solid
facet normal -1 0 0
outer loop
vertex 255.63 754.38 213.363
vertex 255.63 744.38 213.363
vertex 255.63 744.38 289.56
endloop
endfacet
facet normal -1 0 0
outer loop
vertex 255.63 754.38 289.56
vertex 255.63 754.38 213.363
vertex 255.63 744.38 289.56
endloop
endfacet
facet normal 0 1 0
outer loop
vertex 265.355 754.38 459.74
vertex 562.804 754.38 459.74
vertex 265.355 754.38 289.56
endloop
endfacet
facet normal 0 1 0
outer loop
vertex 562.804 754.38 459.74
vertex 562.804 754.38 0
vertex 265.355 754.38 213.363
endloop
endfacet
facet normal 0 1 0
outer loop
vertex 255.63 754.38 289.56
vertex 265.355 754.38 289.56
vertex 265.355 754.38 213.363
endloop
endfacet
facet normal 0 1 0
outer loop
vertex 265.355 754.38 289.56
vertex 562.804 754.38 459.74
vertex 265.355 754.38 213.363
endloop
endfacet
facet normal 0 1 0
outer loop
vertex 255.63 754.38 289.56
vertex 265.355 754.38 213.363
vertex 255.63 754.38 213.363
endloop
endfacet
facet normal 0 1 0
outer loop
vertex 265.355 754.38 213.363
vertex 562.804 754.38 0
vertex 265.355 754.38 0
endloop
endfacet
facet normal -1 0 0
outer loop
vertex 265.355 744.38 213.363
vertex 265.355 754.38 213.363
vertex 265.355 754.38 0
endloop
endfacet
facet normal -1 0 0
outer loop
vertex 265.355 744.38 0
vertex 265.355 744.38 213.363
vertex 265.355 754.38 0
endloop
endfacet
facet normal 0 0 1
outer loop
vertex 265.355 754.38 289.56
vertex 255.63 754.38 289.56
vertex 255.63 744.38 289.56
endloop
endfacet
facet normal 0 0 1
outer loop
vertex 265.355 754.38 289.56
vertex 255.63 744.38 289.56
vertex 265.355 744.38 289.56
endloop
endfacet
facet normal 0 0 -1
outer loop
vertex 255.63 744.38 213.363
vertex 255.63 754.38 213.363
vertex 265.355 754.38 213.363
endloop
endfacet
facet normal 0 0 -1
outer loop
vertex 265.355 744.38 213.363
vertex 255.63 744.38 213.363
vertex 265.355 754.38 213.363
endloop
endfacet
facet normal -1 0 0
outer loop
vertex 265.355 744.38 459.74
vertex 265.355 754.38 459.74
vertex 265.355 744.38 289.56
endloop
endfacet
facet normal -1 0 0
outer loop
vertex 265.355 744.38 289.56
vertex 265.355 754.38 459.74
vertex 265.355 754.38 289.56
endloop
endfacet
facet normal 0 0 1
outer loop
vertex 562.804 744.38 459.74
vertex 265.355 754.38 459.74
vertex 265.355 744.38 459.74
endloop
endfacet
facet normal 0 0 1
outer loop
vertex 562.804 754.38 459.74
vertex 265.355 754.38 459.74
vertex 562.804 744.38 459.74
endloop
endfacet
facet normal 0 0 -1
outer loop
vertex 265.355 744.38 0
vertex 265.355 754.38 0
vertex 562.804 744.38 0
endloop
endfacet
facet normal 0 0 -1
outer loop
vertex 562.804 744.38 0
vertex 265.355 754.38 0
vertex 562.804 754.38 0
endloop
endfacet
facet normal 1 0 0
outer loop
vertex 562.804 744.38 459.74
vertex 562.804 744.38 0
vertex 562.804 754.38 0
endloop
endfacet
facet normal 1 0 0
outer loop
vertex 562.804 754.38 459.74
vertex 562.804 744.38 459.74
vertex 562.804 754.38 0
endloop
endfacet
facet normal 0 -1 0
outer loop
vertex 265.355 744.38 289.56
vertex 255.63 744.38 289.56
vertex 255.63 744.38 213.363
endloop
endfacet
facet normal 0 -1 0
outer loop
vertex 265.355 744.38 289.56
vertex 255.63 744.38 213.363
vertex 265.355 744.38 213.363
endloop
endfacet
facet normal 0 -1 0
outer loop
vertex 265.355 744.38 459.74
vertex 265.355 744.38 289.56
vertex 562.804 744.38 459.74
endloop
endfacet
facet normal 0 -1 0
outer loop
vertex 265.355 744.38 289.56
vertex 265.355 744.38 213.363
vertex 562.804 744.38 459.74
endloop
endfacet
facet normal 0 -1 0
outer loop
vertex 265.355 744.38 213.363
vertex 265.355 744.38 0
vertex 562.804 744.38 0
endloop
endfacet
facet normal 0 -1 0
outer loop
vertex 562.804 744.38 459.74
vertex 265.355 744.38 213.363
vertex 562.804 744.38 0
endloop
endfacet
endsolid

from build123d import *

# Parameters (mm, degrees)
BOSS_EXTRUDE1_DEPTH = 459.74
SKETCH3_W           = 117.668752198
SKETCH3_H           = 459.74
CUT_EXTRUDE1_DEPTH  = 10
SKETCH4_W           = 9.725175386
SKETCH4_H           = 170.179985068
SKETCH4_H_2         = 213.362507046
CUT_EXTRUDE3_DEPTH  = 63


with BuildPart() as part:
    # Sketch1 → Boss-Extrude1 (new body)
    with BuildSketch(Plane.XY):
        Polygon((358.121789204, 754.380000017), (137.961261276, 754.380000017), (137.961261276, 744.380000017), (562.803601281, 744.380000017), (562.803601281, 754.380000017), align=None)
    extrude(amount=BOSS_EXTRUDE1_DEPTH)

    # Sketch3 → Cut-Extrude1 (cut)
    with BuildSketch(Plane.XZ.offset(-744.380000017)):
        with Locations((196.795637375, 229.87)):
            Rectangle(SKETCH3_W, SKETCH3_H)
    extrude(amount=-CUT_EXTRUDE1_DEPTH, mode=Mode.SUBTRACT)

    # Sketch4 → Cut-Extrude3 (cut)
    with BuildSketch(Plane(origin=(0, 754.380000017, 0), x_dir=(1, 0, 0), z_dir=(0, 1, 0))):
        with Locations((260.492601167, -374.650007466)):
            Rectangle(SKETCH4_W, SKETCH4_H)
        with Locations((260.492601167, -106.681253523)):
            Rectangle(SKETCH4_W, SKETCH4_H_2)
    extrude(amount=-CUT_EXTRUDE3_DEPTH, mode=Mode.SUBTRACT)


solid = part.part
